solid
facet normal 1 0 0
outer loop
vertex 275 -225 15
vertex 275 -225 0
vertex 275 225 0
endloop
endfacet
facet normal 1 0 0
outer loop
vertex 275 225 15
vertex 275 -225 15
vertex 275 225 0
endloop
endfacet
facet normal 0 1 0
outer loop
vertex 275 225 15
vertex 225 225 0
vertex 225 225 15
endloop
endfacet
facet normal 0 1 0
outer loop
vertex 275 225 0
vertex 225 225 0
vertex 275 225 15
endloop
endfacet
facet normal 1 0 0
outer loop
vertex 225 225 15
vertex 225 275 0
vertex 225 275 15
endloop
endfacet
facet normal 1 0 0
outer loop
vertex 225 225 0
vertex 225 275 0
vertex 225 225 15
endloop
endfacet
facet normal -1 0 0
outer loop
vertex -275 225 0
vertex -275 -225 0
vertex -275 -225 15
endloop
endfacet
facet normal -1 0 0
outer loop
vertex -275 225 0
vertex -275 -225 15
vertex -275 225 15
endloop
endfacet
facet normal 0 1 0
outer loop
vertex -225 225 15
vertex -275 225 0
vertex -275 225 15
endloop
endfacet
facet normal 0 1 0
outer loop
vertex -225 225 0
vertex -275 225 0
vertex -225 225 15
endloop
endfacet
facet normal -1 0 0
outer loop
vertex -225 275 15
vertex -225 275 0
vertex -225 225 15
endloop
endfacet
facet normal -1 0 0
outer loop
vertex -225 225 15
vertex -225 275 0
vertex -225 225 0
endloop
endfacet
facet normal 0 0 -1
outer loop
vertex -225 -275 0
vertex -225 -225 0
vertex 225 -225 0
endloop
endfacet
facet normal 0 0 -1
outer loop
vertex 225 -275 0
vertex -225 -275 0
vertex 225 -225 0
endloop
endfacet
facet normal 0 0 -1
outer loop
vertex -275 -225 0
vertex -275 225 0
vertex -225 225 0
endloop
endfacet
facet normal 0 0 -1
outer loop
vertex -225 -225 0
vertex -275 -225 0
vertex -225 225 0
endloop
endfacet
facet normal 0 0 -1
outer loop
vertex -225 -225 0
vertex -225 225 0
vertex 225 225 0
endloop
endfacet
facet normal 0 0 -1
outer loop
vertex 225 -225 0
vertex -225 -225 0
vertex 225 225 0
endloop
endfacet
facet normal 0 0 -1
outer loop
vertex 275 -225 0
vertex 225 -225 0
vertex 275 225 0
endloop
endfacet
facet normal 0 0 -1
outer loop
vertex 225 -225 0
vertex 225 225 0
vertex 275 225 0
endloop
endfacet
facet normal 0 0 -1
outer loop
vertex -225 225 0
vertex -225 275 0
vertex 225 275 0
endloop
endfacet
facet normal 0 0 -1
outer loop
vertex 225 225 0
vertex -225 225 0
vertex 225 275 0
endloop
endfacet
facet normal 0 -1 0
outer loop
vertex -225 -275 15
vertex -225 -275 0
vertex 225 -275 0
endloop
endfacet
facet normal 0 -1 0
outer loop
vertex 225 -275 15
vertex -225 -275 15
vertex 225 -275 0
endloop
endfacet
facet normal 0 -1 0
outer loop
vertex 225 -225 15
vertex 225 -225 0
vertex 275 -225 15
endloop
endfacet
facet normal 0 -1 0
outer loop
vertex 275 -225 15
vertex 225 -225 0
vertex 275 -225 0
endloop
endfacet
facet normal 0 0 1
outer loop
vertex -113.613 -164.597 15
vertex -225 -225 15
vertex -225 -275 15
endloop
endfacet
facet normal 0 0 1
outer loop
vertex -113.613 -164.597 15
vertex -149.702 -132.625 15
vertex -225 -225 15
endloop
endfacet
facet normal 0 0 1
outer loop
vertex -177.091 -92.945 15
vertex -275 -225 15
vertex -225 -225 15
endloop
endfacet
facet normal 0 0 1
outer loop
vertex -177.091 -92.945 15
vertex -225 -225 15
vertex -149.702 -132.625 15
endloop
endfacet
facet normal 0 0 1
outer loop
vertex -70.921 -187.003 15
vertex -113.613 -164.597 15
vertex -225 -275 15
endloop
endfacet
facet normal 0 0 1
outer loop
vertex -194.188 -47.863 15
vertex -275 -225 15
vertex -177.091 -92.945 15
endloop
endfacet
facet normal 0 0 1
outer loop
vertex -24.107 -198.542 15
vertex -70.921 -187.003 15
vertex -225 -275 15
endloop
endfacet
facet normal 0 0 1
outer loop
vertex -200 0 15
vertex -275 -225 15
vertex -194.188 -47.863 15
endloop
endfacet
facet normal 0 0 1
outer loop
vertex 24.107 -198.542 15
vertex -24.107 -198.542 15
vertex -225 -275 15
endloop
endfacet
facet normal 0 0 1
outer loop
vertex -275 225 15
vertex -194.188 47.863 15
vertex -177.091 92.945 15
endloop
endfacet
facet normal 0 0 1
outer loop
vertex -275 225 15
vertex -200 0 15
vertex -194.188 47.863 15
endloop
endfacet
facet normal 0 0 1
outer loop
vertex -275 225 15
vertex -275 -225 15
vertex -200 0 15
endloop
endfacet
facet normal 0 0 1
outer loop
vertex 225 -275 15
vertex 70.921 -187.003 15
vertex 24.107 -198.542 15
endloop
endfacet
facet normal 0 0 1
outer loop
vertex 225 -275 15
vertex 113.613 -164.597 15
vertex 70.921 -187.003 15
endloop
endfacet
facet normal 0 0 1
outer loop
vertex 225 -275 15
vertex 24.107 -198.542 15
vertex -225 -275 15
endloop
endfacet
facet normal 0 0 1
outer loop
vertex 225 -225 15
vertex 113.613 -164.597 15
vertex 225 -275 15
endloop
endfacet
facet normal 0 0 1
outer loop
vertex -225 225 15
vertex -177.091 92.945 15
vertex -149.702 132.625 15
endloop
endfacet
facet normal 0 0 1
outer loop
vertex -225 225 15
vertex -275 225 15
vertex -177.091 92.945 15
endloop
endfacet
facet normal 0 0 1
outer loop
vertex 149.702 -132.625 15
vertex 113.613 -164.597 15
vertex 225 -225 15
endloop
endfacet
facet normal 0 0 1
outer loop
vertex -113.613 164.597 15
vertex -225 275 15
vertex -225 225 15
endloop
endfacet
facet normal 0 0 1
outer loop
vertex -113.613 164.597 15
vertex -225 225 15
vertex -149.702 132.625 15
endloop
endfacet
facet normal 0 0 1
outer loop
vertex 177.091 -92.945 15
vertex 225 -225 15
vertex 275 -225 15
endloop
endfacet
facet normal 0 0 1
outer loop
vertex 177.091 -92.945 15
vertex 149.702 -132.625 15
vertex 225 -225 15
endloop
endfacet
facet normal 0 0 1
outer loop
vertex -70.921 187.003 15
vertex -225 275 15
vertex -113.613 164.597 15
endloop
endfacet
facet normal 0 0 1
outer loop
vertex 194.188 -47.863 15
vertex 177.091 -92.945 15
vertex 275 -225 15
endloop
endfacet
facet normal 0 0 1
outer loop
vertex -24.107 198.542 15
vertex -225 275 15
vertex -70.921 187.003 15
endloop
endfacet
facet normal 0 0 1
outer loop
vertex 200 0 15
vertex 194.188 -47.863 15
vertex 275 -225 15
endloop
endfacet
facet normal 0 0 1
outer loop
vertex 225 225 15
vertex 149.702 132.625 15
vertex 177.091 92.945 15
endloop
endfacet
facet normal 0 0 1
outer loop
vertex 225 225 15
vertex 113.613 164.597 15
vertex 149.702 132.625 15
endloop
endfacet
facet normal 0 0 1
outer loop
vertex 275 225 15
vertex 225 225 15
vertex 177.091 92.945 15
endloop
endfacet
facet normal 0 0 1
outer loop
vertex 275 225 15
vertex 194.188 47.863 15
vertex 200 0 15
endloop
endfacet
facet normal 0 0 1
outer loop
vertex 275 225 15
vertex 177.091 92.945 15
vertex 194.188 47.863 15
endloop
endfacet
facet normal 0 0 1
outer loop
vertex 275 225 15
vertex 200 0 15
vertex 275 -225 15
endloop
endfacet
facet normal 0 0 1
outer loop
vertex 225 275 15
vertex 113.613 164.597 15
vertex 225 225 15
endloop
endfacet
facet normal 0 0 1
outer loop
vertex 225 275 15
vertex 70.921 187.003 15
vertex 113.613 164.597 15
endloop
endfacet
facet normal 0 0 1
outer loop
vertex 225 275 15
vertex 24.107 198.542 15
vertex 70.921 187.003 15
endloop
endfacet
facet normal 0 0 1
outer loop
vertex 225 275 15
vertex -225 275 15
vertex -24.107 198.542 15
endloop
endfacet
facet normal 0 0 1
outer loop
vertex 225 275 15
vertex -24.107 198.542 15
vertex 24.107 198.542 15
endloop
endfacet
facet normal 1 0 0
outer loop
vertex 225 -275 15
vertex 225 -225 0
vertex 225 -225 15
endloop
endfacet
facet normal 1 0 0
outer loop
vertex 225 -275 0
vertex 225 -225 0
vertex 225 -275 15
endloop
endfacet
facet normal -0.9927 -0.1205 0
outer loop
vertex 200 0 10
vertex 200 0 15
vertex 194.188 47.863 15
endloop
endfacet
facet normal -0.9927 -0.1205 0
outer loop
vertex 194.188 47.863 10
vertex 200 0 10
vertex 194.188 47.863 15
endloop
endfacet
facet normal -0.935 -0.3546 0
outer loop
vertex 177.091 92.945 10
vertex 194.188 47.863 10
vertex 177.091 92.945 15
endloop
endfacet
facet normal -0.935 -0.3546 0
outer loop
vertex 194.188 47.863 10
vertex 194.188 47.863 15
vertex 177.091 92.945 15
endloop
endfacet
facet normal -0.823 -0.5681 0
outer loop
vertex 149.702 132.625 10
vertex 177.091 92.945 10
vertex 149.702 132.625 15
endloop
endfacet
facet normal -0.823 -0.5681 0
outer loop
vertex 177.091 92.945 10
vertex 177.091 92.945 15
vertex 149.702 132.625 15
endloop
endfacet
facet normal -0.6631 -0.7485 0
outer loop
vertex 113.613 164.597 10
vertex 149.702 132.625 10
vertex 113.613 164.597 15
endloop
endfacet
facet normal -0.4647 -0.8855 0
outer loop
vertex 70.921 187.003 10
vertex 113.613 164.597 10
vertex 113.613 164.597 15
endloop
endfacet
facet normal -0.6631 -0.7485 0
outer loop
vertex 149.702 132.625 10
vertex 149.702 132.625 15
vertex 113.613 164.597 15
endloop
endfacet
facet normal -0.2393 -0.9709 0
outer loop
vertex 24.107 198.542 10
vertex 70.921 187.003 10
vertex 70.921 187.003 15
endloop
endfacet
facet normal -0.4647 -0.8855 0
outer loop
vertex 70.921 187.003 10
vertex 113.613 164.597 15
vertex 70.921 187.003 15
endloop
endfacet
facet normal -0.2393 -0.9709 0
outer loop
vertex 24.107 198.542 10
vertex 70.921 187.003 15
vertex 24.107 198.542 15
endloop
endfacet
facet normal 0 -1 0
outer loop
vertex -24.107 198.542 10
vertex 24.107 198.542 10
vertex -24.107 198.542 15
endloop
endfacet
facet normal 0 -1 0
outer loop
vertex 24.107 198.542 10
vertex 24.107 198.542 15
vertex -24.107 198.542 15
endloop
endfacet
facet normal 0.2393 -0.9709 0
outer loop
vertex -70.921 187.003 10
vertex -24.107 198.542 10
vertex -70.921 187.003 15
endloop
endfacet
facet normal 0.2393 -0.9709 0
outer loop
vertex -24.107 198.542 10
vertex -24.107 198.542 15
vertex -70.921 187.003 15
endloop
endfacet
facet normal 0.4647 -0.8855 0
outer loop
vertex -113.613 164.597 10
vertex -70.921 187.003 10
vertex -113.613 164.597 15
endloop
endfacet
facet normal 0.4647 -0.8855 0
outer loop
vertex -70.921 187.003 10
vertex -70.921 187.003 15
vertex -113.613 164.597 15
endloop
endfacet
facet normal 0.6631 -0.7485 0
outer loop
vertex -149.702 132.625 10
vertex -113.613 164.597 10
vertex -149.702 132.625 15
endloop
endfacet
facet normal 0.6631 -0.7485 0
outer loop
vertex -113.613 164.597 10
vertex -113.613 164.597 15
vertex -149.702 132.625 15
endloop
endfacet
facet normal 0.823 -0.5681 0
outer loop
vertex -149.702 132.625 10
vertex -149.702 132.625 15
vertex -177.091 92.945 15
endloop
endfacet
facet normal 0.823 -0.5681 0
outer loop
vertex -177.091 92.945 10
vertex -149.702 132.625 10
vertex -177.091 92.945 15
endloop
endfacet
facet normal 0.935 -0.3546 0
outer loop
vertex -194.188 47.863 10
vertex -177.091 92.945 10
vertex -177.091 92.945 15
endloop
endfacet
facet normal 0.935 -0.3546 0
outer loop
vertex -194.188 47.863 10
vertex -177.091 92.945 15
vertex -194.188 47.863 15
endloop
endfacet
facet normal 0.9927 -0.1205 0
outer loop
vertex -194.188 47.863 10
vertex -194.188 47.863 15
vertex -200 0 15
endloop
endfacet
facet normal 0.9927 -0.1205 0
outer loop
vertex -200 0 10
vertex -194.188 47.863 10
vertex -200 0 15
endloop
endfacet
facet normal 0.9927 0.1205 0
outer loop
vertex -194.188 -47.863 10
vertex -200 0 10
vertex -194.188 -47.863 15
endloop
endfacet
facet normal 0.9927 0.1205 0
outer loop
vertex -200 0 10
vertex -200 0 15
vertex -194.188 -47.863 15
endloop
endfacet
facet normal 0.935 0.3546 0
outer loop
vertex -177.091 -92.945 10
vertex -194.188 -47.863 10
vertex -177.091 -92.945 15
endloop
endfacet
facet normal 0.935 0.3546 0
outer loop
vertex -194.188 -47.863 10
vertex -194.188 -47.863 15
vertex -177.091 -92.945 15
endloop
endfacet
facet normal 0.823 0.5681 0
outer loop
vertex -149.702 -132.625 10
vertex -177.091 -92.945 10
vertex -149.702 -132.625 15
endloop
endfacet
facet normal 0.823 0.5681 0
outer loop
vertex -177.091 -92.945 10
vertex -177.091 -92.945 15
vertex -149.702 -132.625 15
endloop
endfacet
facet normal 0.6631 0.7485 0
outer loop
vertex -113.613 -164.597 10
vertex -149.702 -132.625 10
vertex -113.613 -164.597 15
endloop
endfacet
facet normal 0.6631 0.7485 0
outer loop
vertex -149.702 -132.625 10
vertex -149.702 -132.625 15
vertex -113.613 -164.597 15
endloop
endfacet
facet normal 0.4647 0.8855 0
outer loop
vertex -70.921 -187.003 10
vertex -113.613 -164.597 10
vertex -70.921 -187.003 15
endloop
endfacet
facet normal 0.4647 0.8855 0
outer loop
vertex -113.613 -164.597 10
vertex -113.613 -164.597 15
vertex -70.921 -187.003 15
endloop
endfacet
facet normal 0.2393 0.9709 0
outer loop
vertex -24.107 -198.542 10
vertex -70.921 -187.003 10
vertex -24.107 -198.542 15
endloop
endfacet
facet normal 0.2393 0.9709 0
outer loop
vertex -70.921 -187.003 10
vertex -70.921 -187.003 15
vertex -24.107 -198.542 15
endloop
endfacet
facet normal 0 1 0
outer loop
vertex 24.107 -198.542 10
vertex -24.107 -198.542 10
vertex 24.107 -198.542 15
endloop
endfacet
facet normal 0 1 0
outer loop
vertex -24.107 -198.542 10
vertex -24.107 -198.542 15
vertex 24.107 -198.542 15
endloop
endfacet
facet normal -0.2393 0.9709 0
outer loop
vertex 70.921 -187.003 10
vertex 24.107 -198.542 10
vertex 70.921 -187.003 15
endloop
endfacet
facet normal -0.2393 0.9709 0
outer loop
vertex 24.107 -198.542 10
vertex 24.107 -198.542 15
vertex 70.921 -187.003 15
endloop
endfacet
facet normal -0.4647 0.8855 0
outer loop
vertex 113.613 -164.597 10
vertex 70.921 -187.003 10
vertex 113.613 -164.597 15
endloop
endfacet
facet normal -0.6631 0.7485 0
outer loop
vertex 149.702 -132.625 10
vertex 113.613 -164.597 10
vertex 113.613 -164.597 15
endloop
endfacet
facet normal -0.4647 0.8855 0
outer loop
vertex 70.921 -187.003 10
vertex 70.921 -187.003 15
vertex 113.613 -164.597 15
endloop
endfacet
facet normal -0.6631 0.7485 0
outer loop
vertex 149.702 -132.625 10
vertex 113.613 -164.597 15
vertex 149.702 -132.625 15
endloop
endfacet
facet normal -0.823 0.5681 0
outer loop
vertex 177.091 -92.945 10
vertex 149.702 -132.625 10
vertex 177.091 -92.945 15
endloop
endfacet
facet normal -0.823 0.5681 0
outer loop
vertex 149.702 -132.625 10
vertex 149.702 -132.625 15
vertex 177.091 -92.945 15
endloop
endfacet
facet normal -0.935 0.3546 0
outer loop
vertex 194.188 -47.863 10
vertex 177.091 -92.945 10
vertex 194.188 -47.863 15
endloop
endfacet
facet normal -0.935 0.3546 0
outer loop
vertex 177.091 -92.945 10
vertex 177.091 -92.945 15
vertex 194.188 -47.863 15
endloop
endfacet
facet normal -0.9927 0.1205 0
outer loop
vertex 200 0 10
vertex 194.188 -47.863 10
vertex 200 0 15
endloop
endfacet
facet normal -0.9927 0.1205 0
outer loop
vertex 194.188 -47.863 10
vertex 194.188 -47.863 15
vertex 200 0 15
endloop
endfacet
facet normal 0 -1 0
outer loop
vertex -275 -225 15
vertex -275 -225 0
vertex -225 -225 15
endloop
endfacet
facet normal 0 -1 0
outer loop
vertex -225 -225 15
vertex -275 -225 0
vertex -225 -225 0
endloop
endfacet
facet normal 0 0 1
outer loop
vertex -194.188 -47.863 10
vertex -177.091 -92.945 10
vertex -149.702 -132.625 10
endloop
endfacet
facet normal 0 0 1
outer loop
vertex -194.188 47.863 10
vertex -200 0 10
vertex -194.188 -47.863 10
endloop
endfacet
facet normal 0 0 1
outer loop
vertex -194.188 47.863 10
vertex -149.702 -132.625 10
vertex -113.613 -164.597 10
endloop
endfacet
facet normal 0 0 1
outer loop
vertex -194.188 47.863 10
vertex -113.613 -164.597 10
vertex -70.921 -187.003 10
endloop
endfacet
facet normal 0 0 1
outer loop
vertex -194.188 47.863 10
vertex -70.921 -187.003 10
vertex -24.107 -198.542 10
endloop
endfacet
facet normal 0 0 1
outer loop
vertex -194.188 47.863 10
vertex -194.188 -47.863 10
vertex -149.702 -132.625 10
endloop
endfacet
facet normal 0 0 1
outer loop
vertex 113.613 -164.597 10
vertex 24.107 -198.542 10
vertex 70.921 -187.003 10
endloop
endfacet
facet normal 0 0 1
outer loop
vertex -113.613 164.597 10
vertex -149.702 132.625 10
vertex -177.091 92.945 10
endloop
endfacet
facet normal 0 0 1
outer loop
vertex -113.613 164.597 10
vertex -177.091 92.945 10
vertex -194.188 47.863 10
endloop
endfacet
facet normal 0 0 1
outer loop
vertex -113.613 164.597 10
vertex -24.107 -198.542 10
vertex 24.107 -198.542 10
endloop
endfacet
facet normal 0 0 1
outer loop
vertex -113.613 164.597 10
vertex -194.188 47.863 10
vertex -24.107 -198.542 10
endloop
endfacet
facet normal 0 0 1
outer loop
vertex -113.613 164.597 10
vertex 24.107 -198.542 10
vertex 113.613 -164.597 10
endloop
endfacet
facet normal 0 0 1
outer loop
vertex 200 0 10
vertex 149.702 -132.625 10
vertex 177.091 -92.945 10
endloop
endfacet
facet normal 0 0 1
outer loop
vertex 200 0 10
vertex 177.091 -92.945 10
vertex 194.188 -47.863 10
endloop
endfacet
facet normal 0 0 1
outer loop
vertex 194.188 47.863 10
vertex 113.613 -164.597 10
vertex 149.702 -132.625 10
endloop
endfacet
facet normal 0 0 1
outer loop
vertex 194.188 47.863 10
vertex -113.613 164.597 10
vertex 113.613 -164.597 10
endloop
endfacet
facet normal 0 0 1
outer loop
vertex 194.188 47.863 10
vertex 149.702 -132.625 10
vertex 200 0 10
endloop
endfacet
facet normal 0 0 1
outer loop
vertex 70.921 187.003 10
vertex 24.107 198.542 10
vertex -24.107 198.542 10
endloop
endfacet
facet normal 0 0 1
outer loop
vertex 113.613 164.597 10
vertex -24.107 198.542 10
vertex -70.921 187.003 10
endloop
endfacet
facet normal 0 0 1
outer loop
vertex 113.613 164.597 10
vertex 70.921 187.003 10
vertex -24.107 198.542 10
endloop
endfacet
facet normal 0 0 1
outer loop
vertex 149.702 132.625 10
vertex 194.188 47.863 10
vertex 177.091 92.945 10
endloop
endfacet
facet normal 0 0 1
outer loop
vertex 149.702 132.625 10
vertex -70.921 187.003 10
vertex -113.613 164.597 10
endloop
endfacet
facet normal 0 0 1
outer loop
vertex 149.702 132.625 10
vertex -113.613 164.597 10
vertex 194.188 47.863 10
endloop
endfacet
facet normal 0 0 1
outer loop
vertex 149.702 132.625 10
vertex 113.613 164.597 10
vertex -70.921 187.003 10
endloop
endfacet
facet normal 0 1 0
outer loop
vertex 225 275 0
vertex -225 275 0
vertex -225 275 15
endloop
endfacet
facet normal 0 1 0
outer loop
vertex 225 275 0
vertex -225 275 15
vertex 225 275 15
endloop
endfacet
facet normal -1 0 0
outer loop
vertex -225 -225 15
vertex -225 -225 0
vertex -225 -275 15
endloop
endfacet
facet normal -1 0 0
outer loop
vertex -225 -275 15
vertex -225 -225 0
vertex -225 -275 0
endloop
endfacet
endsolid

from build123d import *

# Parameters (mm, degrees)
F0_W     = 550
F0_H     = 550
F1_DEPTH = 15
F2_R     = 200
F3_DEPTH = 5
F4_W     = 50
F4_H     = 50
F5_DEPTH = 15


with BuildPart() as f1:
    # F0 (on Top) → F1 (new body)
    with BuildSketch(Plane.XY):
        Rectangle(F0_W, F0_H)
    extrude(amount=F1_DEPTH)

    # F2 (on face) → F3 (cut)
    with BuildSketch(Plane.XY.offset(15)):
        Circle(F2_R)
    extrude(amount=-F3_DEPTH, mode=Mode.SUBTRACT)

    # F4 (on face) → F5 (cut, through all)
    with BuildSketch(Plane(origin=(0, 0, 0), x_dir=(1, 0, 0), z_dir=(0, 0, -1))):
        with Locations((-250, 250)):
            Rectangle(F4_W, F4_H)
        with Locations((250, 250)):
            Rectangle(F4_W, F4_H)
        with Locations((-250, -250)):
            Rectangle(F4_W, F4_H)
        with Locations((250, -250)):
            Rectangle(F4_W, F4_H)
    extrude(amount=-F5_DEPTH, mode=Mode.SUBTRACT)


solid = f1.part
